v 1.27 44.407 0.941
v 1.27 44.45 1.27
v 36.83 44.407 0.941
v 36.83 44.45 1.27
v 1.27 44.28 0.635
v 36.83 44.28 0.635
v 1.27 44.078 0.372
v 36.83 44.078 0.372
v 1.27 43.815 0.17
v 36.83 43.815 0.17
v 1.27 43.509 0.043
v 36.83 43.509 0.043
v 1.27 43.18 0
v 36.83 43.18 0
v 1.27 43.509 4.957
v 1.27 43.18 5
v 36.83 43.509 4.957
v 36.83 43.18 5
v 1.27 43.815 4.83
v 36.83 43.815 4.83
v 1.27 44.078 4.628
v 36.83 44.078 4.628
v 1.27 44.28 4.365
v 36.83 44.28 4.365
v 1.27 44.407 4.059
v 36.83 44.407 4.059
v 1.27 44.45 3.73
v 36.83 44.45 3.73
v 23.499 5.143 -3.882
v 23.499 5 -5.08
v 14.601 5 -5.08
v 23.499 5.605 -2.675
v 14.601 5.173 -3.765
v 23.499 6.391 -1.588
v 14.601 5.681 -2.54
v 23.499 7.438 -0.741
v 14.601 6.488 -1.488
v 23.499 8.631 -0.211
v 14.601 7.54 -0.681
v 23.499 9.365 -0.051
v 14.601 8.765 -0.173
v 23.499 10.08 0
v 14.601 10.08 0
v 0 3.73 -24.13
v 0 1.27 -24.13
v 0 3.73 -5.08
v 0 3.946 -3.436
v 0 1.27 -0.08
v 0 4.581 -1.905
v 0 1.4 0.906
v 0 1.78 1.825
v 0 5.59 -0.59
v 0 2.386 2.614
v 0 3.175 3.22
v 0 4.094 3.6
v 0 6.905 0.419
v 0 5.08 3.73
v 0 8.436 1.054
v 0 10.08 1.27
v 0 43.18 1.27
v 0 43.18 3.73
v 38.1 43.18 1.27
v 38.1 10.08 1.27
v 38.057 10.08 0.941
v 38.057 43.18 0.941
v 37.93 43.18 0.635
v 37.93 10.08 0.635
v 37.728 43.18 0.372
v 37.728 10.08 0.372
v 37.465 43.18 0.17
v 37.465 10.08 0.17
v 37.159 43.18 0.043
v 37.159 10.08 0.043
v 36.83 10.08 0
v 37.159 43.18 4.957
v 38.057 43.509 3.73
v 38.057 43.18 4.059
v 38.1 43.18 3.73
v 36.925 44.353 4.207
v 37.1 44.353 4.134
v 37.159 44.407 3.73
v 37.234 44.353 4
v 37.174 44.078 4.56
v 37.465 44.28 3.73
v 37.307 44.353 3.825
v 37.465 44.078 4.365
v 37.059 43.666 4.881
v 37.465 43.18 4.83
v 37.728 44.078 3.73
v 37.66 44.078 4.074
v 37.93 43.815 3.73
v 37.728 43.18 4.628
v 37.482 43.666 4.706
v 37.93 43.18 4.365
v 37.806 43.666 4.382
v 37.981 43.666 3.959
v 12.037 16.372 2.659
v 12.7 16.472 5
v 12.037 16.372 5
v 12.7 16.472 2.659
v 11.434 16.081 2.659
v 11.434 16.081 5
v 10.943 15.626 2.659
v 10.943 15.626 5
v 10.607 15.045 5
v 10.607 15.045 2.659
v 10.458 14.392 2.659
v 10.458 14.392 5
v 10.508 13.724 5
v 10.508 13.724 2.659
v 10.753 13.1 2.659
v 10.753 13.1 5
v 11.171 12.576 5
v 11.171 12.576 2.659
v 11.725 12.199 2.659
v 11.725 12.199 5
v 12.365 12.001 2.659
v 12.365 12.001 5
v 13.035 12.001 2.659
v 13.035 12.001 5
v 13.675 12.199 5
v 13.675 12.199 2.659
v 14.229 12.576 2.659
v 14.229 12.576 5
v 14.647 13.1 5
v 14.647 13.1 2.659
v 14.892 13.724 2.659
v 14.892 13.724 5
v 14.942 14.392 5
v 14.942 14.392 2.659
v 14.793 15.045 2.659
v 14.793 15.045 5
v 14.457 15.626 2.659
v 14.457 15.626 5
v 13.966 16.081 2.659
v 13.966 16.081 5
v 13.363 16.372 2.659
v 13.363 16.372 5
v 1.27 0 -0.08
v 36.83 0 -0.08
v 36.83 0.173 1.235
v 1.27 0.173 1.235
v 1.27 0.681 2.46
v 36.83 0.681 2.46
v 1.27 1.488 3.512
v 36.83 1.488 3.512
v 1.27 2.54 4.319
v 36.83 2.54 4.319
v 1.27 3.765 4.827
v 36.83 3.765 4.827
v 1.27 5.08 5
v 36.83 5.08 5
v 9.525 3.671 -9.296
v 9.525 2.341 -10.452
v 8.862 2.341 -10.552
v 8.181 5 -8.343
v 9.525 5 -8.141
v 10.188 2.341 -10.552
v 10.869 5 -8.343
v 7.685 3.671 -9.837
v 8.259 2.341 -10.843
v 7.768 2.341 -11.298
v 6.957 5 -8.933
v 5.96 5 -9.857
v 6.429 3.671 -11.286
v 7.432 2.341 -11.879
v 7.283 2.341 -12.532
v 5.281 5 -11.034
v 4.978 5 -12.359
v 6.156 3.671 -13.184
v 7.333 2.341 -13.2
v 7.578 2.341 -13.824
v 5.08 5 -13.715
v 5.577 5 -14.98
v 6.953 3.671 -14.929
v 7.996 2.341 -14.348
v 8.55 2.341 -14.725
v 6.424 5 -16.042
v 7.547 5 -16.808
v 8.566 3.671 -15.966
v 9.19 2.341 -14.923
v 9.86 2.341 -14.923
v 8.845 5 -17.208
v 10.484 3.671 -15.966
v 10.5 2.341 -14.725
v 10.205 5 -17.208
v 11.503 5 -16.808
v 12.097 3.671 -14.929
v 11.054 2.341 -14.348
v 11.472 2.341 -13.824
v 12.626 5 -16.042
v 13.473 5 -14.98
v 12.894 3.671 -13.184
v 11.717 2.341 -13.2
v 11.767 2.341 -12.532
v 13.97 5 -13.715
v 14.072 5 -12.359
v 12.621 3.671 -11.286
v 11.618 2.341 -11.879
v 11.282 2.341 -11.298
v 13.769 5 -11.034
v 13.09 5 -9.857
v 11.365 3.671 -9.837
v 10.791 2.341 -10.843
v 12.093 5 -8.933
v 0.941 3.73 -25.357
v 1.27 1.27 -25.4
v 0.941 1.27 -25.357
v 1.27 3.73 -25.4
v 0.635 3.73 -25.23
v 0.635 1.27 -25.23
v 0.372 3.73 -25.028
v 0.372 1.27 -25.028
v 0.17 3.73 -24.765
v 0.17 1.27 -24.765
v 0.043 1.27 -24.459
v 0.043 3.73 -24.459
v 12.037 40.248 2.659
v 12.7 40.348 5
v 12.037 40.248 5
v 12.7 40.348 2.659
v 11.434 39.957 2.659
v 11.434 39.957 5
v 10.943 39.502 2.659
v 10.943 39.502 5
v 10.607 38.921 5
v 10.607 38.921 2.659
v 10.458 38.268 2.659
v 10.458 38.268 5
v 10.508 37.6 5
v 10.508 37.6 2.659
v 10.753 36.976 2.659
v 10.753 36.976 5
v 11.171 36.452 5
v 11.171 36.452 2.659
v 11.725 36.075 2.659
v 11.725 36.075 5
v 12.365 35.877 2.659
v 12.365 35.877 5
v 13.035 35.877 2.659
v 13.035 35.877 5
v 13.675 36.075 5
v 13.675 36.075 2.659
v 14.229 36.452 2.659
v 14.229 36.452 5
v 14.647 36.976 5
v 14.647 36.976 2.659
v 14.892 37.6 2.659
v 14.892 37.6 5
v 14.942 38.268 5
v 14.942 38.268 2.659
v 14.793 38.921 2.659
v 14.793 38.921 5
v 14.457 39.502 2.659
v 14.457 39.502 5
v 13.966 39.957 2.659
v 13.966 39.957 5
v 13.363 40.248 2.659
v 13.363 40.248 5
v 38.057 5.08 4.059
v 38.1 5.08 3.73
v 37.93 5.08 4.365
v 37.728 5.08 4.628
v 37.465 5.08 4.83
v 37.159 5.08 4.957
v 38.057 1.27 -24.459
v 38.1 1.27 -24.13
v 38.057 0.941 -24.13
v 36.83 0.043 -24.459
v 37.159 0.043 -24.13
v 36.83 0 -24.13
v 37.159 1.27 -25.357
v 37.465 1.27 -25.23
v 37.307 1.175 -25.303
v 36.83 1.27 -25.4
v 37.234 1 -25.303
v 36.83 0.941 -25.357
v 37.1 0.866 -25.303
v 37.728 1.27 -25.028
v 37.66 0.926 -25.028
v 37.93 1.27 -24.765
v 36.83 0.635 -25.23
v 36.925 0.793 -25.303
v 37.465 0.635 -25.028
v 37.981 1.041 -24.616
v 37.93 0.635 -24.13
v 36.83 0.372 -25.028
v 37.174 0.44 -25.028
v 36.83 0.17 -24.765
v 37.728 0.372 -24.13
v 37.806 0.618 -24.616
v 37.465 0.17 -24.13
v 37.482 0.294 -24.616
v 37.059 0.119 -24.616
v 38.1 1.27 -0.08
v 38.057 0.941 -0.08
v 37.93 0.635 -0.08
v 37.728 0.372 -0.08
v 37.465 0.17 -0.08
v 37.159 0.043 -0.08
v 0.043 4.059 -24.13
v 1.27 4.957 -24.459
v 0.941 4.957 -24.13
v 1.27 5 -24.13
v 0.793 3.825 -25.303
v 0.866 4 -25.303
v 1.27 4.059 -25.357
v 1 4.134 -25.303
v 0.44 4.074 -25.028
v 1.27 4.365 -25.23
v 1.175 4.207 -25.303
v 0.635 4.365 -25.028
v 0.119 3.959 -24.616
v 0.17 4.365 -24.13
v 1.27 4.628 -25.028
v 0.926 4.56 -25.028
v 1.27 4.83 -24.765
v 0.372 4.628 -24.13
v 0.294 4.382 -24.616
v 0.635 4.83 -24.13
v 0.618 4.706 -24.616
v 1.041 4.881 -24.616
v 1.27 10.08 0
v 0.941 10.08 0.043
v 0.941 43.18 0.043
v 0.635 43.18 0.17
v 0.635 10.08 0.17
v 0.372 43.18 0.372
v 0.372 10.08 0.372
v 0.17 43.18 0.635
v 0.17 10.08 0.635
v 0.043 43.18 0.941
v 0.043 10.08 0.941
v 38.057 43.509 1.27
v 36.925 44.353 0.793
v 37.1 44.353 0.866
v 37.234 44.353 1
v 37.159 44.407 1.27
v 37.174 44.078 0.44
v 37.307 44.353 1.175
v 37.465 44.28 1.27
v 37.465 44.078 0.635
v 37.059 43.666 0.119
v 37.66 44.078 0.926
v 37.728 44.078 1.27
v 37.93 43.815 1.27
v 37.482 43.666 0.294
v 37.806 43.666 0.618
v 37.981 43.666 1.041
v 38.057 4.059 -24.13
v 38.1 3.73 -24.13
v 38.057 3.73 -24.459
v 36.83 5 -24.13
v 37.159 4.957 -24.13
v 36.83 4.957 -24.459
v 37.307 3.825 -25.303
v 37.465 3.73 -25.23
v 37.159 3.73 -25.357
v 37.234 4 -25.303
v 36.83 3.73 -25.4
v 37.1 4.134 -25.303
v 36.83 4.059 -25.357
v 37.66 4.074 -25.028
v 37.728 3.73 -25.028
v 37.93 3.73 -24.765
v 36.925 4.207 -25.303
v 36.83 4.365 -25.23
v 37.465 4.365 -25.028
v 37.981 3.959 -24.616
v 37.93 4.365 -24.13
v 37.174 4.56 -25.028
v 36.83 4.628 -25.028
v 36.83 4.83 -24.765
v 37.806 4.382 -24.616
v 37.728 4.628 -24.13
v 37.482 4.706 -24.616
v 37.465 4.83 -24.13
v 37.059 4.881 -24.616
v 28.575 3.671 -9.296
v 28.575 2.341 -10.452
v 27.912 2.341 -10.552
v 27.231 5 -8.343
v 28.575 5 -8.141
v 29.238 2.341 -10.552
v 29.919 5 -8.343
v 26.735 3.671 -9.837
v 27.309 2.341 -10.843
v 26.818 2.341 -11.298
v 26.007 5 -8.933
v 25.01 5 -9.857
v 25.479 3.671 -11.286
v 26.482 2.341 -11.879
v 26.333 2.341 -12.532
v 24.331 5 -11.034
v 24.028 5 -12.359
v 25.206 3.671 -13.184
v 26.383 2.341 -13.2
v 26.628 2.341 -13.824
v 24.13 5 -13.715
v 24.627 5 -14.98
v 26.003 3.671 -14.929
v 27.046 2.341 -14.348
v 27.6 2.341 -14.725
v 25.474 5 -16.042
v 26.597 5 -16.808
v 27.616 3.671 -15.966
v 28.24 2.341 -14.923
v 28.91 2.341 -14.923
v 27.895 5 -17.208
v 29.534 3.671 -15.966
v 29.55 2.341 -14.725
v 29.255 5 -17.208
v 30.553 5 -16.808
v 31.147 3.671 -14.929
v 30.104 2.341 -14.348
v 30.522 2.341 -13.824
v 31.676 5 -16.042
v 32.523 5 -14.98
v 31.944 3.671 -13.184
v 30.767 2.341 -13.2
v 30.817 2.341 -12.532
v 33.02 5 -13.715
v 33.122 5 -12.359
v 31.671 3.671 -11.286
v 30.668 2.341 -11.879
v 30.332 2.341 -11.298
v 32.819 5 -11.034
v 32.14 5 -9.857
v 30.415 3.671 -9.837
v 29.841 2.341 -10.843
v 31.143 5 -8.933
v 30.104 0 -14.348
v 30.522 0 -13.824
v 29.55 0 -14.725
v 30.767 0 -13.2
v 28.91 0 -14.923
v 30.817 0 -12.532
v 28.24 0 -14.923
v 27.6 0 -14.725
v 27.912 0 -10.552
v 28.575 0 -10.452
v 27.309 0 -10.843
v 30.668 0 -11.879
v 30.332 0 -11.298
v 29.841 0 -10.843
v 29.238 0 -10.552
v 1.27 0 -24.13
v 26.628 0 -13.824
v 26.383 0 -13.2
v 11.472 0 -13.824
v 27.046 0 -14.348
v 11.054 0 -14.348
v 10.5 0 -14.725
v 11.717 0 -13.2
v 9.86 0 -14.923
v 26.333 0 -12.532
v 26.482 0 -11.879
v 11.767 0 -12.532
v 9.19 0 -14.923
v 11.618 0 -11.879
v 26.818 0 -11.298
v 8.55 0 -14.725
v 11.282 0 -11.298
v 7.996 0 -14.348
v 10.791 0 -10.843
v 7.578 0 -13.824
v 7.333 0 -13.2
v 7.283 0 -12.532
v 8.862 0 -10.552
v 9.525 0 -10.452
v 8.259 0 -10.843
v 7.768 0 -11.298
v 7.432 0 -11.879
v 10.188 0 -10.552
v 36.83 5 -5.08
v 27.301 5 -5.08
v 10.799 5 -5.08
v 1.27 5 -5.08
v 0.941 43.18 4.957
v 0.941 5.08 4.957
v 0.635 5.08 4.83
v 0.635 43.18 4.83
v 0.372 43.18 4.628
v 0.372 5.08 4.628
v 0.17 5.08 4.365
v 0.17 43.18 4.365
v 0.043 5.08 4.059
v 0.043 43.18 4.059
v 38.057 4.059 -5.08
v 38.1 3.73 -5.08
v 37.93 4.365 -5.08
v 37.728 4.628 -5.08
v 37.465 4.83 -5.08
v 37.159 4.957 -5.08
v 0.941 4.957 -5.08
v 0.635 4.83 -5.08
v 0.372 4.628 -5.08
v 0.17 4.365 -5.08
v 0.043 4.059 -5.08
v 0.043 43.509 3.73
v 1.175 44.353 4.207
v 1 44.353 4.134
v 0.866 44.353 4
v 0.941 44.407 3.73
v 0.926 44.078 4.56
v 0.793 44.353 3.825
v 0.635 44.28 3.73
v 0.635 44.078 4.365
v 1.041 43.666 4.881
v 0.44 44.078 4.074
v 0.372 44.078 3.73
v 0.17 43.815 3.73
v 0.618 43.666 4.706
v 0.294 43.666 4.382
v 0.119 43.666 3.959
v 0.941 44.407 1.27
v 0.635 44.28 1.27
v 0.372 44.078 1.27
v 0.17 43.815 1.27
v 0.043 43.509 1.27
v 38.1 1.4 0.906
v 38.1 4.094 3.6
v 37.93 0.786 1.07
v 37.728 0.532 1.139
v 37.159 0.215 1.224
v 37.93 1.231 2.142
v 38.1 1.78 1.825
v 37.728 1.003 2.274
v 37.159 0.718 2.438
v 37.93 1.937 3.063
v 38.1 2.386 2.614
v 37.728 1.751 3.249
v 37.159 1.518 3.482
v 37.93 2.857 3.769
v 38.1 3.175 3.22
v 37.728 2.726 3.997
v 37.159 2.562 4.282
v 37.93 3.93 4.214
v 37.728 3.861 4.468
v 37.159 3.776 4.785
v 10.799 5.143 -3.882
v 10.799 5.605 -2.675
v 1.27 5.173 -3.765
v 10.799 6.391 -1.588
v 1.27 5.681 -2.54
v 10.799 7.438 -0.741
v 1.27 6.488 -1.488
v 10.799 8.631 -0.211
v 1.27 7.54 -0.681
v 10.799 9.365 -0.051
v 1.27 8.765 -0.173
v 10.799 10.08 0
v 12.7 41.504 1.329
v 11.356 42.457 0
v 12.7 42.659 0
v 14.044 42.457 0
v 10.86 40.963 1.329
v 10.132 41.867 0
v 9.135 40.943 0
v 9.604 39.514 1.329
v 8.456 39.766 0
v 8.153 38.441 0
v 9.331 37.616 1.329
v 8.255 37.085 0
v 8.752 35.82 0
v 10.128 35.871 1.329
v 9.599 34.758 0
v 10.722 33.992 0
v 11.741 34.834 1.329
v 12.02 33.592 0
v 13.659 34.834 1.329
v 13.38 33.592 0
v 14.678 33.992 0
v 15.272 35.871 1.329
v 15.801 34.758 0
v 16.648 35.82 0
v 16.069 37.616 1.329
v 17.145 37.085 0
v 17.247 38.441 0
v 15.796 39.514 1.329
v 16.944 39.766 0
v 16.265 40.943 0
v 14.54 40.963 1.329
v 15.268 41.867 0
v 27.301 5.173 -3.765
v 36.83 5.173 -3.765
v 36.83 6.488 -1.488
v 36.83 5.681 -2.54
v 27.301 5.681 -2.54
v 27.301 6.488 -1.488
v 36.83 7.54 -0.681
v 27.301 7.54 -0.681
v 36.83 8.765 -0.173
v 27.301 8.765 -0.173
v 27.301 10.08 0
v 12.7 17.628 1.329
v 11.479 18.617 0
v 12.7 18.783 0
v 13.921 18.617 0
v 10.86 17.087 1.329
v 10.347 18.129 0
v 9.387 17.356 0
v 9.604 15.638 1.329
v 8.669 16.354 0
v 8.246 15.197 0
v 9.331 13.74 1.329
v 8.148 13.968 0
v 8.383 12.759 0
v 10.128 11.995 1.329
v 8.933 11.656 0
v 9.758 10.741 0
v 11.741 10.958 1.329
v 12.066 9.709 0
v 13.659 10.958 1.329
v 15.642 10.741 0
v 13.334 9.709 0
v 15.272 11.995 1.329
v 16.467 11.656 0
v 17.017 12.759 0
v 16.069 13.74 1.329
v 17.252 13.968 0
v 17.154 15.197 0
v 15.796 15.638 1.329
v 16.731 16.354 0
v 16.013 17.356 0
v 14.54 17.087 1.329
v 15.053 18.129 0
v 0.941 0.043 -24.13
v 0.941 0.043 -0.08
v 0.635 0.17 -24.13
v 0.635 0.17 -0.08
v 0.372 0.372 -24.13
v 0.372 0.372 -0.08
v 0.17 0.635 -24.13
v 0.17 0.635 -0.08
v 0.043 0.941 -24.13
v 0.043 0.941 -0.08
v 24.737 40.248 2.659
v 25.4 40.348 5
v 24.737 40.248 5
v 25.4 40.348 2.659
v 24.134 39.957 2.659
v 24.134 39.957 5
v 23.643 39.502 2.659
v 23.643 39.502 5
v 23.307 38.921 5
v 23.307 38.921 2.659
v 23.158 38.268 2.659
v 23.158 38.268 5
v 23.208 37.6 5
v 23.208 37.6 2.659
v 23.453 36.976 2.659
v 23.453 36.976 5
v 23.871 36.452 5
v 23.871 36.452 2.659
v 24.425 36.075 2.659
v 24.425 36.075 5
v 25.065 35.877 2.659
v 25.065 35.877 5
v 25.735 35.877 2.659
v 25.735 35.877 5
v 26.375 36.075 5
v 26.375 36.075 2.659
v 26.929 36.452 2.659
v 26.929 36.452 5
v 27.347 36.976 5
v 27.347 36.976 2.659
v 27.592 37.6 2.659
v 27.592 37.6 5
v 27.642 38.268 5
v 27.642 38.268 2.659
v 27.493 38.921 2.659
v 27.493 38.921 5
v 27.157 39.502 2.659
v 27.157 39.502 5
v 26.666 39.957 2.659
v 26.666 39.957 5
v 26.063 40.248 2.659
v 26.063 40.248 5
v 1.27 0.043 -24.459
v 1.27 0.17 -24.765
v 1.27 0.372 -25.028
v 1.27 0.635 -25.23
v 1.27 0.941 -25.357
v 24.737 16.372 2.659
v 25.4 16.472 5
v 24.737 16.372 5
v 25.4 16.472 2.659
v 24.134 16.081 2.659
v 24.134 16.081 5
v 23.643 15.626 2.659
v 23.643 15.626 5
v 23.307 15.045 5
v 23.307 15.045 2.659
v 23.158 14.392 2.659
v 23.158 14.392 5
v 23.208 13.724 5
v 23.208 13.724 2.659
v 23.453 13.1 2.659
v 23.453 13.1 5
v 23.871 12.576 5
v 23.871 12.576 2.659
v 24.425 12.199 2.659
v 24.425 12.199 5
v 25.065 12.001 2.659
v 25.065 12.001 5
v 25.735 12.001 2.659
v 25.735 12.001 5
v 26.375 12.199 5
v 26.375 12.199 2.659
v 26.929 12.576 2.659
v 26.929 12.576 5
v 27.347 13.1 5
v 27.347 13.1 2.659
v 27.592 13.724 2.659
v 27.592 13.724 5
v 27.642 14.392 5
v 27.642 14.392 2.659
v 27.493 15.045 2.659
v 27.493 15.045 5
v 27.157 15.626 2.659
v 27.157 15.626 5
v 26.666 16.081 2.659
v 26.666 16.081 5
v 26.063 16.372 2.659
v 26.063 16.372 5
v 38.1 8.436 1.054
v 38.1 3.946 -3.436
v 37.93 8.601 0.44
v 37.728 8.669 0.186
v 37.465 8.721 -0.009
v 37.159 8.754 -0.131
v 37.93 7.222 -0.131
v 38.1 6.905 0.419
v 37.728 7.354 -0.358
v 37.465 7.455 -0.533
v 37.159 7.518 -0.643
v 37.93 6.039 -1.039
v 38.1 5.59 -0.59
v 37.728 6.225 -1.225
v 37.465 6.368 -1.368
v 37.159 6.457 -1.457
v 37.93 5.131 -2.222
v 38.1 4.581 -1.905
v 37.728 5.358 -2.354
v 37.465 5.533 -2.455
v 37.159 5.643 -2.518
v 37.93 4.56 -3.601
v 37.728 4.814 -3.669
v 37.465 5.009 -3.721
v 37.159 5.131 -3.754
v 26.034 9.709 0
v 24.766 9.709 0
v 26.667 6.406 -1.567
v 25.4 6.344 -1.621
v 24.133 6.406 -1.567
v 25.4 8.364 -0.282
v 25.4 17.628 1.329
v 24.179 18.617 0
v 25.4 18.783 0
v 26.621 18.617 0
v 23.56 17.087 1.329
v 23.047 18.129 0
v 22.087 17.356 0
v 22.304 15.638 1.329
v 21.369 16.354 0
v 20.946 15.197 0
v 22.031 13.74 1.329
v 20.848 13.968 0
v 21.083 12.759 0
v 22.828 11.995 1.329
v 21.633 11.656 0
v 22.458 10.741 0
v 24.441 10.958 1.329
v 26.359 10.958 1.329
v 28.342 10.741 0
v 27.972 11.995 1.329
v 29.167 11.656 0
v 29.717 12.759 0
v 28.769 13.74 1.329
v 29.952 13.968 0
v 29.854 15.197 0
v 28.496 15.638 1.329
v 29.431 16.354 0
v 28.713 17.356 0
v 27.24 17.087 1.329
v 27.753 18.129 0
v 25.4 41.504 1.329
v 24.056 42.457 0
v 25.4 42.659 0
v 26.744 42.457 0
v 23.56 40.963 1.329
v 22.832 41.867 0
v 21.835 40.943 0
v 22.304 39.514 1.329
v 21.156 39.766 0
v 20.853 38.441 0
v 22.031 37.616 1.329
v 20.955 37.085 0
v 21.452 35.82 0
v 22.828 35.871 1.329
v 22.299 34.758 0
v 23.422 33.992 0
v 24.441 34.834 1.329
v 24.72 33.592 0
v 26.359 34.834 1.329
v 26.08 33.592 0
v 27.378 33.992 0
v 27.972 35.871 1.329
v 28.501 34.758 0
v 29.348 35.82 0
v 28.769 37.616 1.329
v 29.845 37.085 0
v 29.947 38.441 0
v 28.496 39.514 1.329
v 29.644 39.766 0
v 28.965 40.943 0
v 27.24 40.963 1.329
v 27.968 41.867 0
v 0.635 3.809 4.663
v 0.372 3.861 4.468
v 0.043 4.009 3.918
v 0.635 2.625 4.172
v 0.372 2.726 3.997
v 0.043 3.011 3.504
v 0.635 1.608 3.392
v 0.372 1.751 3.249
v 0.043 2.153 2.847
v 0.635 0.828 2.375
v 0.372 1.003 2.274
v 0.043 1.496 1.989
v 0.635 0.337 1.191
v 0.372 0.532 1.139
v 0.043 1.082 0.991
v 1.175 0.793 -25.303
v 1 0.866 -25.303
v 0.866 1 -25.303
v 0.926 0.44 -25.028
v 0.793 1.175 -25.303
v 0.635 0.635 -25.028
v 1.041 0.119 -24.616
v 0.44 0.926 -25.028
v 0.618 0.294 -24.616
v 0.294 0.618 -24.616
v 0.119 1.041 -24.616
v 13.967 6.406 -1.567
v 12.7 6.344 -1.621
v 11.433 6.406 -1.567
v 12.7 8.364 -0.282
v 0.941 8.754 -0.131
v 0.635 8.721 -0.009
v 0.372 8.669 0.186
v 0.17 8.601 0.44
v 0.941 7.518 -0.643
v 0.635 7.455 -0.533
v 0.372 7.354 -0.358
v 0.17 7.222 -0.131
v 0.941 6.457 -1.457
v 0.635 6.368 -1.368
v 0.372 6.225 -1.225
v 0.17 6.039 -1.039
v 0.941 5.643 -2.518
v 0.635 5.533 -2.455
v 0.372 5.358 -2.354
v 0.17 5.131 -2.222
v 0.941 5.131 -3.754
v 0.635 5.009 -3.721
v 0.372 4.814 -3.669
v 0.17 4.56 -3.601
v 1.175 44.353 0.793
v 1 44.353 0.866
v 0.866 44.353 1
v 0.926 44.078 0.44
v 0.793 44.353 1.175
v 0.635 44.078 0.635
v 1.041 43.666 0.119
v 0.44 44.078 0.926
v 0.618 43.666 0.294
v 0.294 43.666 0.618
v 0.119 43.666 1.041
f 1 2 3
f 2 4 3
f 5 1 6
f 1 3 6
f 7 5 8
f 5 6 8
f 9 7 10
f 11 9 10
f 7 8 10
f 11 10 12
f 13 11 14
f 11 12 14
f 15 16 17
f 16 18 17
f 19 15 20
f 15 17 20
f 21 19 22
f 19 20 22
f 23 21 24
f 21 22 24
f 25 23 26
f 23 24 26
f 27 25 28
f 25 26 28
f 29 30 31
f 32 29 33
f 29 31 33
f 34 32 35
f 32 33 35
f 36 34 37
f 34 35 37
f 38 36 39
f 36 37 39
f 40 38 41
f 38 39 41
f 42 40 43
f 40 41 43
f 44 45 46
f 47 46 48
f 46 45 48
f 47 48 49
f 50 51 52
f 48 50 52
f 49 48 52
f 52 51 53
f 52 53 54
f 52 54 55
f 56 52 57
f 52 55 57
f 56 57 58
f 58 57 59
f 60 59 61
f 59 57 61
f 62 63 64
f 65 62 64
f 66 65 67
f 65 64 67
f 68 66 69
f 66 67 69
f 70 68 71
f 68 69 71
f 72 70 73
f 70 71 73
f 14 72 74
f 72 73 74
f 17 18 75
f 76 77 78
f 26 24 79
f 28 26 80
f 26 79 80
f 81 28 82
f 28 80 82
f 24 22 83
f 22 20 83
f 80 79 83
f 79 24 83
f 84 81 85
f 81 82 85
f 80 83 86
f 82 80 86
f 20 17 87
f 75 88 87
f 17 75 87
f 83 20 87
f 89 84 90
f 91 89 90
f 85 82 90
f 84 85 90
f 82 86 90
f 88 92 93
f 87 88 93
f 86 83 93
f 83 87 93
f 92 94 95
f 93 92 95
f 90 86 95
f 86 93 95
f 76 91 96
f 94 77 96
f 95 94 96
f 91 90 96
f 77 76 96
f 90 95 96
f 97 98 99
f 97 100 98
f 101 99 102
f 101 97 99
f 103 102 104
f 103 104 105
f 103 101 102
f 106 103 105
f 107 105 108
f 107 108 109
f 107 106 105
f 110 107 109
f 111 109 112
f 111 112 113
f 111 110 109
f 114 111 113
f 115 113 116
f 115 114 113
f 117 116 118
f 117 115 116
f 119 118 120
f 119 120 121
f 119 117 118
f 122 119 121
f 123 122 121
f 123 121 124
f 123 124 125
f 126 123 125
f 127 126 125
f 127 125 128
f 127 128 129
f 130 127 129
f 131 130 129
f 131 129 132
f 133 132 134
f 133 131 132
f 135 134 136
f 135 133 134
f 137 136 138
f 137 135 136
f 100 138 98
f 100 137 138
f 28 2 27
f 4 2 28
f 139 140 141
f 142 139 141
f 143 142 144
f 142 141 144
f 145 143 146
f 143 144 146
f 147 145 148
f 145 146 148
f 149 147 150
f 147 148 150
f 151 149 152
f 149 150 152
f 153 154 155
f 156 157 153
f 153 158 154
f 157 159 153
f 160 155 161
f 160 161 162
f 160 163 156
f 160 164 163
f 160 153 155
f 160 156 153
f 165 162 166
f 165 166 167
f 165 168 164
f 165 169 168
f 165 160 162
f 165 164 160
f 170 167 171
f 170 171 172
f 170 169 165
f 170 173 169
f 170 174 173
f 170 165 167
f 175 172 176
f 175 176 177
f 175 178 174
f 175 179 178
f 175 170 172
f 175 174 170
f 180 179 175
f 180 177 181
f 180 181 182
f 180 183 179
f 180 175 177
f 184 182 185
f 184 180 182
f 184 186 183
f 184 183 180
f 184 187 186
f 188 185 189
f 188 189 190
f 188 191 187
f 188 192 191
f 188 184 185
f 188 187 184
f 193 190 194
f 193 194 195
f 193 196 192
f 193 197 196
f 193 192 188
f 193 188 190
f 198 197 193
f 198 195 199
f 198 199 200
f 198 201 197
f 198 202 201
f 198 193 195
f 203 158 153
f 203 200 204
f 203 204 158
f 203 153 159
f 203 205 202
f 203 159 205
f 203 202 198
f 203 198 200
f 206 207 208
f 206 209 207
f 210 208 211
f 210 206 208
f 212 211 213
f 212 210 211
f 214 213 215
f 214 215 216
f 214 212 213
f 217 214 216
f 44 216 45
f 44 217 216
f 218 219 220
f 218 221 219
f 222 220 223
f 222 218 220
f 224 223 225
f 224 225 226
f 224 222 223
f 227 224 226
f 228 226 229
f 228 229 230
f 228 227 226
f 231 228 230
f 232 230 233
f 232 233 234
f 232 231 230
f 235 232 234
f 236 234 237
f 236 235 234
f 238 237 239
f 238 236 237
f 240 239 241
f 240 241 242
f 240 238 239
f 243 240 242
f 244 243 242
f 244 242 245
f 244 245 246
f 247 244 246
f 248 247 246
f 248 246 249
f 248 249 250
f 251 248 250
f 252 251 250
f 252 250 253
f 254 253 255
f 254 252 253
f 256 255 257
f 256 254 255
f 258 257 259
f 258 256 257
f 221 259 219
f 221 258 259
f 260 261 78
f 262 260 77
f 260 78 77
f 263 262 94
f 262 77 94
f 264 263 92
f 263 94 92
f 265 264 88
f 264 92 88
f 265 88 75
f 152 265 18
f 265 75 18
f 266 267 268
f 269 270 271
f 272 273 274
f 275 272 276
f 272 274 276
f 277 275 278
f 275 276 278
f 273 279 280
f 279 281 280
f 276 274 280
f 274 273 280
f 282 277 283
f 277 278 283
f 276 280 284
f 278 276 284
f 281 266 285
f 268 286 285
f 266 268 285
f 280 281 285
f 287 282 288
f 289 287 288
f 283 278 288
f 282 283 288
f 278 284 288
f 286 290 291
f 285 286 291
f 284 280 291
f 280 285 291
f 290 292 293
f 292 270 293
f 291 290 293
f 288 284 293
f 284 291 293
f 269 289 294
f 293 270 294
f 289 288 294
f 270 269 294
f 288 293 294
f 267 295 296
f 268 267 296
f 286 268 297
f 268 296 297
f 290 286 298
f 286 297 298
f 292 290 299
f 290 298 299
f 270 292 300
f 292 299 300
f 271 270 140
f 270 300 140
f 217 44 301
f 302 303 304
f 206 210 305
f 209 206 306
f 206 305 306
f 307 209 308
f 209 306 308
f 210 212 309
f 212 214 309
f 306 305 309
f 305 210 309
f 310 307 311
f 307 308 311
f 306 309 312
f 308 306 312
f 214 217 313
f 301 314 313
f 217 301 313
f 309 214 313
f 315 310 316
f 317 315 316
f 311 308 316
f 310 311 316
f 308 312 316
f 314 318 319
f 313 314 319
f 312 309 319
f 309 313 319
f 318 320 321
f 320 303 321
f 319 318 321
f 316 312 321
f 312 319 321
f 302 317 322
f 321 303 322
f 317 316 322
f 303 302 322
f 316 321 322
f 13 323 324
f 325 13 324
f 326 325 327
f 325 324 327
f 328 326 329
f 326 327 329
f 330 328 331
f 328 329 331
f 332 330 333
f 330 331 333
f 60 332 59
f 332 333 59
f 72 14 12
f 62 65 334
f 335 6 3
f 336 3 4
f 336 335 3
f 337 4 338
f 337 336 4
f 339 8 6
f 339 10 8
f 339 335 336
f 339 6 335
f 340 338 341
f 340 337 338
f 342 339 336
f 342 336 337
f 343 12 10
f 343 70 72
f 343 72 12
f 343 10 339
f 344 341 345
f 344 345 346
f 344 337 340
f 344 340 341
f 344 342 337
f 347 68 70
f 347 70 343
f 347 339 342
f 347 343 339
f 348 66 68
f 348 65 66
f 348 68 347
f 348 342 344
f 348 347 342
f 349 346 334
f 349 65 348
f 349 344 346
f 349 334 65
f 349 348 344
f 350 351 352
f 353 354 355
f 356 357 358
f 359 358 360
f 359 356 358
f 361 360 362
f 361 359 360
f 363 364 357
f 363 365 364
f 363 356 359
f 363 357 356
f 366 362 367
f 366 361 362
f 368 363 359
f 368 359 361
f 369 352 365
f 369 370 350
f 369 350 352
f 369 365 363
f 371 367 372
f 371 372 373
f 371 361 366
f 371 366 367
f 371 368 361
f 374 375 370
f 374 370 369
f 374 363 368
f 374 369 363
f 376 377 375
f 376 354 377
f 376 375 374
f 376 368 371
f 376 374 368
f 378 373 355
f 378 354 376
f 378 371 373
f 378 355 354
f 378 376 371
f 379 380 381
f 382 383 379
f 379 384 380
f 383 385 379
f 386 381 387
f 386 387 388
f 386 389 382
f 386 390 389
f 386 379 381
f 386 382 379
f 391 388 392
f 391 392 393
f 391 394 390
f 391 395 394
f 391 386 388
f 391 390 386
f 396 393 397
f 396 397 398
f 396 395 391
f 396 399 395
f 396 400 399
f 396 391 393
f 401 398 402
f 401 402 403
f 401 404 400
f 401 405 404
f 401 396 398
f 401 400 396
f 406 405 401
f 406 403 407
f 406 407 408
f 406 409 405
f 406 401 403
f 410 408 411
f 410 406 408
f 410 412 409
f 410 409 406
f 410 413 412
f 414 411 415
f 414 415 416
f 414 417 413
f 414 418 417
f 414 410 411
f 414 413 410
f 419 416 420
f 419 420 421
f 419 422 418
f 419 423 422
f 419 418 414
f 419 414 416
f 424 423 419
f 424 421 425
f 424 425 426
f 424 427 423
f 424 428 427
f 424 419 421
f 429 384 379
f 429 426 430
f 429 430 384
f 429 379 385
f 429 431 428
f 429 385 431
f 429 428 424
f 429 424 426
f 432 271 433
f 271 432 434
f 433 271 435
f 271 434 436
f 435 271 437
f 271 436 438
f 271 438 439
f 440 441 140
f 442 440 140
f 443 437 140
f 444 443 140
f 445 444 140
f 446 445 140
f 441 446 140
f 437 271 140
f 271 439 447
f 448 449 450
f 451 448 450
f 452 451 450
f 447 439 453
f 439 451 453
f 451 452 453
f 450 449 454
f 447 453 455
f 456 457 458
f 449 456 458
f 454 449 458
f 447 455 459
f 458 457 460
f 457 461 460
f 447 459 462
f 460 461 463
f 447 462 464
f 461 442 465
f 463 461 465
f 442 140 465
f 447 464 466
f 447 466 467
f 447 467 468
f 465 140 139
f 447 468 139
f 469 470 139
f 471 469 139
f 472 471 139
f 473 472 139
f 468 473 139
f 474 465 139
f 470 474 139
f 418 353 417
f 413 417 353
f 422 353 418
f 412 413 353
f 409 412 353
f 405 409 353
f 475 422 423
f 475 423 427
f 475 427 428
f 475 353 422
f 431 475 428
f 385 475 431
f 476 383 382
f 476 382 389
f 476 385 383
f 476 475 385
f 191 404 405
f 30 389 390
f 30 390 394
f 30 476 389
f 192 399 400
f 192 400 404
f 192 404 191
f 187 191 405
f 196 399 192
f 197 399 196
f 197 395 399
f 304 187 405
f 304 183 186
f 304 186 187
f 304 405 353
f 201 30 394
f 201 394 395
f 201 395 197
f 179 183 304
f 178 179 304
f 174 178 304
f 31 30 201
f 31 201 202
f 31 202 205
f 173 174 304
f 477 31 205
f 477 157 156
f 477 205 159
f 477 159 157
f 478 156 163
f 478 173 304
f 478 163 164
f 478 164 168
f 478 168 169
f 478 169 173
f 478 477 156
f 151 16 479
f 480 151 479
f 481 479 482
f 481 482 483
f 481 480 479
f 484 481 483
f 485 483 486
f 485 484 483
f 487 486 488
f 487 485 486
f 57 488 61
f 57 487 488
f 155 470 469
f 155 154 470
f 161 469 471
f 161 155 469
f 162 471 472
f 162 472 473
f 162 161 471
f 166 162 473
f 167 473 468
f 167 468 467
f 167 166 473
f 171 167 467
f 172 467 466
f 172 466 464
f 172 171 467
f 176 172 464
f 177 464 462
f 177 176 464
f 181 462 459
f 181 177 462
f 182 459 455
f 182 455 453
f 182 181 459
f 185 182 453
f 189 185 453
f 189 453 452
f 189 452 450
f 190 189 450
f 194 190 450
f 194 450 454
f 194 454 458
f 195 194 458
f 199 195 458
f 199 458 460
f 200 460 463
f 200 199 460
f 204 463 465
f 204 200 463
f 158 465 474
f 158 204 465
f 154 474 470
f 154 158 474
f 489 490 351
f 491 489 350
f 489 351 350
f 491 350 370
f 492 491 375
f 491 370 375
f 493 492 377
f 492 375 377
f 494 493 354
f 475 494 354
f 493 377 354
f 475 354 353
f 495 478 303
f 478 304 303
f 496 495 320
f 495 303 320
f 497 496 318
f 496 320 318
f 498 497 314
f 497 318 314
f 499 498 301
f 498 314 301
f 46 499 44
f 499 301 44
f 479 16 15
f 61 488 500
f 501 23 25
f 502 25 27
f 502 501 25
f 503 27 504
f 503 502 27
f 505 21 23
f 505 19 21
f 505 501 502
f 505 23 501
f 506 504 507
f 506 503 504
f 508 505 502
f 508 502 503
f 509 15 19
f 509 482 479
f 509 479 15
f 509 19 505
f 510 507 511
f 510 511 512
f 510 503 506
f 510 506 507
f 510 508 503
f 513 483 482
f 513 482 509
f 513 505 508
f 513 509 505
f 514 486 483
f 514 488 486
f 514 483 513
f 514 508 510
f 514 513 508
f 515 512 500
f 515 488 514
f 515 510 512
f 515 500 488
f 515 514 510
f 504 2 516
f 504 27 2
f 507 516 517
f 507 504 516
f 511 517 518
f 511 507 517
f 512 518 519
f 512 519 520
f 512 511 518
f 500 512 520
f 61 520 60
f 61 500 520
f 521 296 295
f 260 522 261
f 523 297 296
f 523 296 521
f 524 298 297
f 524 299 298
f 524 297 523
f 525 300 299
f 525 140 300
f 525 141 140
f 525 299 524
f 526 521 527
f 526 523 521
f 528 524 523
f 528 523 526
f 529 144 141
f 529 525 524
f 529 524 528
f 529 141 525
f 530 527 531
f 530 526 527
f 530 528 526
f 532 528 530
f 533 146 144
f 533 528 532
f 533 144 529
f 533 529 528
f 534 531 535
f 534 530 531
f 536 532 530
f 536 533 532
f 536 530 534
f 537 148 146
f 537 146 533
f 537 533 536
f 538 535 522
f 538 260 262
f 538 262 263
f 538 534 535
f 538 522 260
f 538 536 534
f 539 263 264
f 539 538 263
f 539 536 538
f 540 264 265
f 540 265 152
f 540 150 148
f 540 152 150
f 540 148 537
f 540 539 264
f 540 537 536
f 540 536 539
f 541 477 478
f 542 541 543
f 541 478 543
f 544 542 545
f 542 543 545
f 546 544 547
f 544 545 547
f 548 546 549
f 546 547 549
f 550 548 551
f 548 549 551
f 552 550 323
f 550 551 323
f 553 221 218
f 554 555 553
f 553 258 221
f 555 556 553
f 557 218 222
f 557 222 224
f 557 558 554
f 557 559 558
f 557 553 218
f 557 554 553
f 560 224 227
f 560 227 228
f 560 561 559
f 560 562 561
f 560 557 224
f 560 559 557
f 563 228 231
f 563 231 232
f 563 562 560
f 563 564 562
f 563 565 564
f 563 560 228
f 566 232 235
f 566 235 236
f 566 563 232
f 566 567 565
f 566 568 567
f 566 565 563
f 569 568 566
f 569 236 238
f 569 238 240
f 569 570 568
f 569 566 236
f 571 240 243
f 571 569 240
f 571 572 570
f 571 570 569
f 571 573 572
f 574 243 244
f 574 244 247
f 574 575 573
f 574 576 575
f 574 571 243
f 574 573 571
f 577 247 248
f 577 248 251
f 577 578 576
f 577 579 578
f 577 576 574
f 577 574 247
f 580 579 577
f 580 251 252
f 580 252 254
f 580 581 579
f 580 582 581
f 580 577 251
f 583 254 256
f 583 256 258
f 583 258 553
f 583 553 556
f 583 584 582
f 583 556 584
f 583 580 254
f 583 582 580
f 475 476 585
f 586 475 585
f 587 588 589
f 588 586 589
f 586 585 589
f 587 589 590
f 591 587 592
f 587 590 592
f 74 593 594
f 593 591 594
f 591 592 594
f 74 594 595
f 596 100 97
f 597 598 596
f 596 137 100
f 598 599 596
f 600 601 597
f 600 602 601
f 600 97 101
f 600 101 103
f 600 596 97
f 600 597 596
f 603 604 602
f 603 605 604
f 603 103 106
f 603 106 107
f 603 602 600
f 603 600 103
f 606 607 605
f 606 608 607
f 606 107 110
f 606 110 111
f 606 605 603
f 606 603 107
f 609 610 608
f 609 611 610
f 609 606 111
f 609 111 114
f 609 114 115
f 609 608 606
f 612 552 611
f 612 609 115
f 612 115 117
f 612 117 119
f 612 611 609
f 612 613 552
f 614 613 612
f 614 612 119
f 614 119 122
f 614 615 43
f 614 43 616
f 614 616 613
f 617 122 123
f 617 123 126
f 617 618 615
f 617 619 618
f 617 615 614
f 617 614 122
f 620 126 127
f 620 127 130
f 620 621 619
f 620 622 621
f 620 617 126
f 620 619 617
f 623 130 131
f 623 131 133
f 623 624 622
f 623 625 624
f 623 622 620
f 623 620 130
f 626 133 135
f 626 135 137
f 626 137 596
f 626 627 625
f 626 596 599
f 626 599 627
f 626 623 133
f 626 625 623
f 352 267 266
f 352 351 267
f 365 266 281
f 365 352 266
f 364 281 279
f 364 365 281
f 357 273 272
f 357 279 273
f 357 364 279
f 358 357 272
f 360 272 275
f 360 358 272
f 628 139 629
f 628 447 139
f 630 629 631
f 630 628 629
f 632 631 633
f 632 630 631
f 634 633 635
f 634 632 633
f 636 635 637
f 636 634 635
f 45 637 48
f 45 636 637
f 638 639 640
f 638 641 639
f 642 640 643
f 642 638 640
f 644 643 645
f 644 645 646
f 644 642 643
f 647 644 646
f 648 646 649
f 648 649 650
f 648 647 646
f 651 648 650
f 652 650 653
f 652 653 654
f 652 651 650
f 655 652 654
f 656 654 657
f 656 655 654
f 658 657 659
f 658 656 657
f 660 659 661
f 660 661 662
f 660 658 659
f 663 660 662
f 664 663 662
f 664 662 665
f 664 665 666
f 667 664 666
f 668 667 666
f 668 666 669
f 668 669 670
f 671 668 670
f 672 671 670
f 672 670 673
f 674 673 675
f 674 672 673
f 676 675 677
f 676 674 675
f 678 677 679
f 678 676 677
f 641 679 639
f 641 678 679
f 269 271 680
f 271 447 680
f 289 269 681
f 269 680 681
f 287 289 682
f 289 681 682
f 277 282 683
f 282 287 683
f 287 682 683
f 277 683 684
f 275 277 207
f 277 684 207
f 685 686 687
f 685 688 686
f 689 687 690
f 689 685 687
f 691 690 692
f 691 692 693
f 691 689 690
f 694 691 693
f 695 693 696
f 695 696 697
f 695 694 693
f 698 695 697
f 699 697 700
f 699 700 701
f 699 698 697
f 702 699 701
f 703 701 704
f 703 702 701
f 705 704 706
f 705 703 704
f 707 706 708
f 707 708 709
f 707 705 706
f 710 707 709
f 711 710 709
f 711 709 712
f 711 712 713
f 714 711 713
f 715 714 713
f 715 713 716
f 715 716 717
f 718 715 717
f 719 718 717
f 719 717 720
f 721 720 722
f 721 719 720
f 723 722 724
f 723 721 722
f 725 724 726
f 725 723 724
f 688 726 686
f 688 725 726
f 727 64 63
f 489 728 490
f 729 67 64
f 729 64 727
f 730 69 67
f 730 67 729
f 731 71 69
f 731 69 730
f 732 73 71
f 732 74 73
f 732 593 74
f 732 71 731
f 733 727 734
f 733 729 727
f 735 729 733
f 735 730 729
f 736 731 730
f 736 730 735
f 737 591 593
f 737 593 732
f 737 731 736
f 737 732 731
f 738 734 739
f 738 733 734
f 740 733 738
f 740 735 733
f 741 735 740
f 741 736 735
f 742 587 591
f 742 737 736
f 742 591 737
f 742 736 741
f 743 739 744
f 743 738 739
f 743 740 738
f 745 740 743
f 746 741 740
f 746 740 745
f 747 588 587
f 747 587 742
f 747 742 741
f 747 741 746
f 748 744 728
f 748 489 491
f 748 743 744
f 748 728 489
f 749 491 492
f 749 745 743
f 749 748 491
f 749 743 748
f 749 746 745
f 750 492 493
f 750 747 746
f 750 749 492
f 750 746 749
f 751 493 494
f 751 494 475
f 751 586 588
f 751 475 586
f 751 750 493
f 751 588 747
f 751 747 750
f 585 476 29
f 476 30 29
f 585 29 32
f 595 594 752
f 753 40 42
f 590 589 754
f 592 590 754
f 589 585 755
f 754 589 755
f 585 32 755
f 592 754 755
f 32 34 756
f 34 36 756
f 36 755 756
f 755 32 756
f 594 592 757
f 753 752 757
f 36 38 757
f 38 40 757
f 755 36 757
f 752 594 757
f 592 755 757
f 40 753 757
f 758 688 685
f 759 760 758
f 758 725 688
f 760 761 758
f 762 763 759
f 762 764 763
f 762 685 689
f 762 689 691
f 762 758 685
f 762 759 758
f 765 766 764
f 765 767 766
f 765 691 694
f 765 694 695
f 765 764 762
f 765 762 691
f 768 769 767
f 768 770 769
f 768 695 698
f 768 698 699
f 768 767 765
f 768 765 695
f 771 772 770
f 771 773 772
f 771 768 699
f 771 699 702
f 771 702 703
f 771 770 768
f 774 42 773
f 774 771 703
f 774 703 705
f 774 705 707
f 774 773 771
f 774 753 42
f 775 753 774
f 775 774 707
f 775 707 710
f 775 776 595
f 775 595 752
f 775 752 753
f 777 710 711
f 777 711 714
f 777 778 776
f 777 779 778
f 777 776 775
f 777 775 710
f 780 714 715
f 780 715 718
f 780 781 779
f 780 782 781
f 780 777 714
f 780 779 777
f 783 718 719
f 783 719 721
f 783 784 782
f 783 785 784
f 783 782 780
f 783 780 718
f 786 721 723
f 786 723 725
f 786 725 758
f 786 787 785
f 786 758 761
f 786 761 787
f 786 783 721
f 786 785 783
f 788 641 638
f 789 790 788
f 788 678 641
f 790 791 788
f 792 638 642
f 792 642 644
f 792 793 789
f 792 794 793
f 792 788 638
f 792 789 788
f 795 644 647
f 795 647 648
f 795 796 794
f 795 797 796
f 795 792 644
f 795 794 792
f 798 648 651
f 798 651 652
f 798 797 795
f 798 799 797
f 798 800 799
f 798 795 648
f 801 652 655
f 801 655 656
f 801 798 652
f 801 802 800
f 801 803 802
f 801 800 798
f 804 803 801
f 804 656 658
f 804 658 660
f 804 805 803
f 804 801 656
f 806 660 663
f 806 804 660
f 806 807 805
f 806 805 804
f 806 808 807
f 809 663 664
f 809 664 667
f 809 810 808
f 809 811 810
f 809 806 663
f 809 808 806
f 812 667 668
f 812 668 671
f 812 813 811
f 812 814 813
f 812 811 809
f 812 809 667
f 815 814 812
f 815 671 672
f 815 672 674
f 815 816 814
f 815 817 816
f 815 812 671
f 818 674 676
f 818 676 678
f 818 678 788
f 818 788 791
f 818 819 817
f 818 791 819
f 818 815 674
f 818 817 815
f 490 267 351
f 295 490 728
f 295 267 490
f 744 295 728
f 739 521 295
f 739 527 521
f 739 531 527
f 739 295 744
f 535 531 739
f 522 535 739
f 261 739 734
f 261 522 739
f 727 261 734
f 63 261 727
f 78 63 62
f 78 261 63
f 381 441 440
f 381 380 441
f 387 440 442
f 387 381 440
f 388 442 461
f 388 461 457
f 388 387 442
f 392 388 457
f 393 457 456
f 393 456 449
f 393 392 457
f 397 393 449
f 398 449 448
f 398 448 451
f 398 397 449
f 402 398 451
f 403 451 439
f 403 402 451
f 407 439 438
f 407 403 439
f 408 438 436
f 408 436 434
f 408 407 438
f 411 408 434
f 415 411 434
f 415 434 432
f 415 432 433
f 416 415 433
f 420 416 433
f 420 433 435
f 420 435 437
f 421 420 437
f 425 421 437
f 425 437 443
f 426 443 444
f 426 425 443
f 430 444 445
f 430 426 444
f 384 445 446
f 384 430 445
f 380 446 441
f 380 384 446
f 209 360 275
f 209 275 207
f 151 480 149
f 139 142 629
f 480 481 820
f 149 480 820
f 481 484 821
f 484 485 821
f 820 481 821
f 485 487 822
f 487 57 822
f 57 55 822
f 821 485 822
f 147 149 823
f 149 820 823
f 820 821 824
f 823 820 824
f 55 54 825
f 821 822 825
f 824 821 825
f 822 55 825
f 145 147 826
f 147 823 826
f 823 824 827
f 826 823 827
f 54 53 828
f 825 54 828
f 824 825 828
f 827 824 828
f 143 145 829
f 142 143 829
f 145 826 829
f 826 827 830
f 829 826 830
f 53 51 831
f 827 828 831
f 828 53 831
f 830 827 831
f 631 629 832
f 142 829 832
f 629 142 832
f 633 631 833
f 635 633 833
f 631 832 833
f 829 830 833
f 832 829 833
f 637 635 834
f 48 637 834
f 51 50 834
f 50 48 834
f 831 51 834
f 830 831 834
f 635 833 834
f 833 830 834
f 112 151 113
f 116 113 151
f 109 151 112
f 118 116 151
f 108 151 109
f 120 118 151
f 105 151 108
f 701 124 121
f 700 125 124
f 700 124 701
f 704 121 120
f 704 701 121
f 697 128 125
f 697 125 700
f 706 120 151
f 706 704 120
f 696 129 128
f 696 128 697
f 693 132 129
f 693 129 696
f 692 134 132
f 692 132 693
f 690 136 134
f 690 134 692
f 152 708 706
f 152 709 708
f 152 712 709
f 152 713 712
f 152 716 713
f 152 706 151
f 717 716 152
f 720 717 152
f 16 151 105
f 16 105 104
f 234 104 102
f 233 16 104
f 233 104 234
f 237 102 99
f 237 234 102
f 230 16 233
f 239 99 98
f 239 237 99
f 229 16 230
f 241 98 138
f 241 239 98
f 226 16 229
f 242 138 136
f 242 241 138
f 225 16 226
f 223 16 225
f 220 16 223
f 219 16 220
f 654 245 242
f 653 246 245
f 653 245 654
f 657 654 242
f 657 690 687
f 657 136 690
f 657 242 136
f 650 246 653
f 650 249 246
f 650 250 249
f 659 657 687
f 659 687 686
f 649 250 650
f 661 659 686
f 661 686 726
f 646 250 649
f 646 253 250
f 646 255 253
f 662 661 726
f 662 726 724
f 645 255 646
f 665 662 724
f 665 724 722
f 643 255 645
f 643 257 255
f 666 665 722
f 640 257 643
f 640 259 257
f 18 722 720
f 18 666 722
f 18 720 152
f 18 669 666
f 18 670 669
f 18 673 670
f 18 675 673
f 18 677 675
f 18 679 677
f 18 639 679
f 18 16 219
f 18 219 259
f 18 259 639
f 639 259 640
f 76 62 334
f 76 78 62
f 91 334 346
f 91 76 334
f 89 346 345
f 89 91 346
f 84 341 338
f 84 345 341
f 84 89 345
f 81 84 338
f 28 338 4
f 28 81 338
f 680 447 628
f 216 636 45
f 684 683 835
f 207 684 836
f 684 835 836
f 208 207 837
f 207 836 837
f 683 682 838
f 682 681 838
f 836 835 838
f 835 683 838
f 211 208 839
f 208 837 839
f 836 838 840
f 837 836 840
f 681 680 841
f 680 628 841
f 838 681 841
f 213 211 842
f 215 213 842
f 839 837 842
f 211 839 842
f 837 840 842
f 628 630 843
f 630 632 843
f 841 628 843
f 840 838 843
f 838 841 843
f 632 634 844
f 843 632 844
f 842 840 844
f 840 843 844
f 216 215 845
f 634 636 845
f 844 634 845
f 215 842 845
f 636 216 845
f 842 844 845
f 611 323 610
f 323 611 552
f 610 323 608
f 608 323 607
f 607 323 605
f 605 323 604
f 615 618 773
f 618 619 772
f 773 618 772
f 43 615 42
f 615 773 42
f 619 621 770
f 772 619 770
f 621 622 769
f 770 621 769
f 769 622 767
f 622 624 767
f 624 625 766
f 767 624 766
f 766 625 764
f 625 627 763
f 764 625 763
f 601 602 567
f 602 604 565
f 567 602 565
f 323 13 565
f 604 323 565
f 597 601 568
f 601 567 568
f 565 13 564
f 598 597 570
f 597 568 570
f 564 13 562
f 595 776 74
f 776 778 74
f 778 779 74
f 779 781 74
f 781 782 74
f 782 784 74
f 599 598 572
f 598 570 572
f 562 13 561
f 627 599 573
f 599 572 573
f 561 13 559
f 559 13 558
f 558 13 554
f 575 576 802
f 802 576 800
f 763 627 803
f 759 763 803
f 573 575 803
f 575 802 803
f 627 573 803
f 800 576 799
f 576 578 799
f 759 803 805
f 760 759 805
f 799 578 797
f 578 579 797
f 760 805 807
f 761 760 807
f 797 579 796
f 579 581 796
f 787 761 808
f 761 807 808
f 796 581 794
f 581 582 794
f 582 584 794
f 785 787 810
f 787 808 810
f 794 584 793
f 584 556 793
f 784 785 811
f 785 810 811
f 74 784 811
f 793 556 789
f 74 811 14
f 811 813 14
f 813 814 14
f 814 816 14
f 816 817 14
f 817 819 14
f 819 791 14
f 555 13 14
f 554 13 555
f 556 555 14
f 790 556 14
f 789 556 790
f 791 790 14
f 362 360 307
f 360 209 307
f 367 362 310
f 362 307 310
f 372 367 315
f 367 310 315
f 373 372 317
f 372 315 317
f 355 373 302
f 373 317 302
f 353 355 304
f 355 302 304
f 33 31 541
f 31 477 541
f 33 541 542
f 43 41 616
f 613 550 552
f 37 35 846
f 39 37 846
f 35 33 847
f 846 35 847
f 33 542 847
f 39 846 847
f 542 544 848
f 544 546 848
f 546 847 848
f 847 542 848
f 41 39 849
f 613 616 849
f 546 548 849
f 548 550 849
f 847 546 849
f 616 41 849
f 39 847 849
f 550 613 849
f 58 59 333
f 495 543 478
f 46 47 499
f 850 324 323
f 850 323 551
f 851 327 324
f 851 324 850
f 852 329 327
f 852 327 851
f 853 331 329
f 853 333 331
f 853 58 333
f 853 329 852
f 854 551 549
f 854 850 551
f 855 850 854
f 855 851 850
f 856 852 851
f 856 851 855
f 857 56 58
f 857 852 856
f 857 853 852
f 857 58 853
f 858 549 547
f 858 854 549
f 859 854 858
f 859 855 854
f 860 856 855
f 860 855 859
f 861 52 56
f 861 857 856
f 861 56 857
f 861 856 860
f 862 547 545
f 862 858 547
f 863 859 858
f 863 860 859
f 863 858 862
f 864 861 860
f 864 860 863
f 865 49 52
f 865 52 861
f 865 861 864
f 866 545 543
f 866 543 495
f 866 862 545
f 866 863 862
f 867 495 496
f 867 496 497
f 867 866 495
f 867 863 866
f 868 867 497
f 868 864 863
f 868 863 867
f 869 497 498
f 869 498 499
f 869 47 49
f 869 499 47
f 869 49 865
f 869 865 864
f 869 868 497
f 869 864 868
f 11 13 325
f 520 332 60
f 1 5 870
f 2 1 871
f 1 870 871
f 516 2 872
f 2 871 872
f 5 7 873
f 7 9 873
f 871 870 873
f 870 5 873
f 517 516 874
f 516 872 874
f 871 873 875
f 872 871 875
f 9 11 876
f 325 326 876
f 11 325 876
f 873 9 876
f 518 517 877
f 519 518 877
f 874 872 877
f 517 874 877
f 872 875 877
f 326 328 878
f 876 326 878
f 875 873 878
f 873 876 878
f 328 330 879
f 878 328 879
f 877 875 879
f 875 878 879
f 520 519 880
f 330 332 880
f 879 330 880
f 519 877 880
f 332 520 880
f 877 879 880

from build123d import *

# Parameters (mm, degrees)
SKETCH1_W                                     = 38.1
SKETCH1_H                                     = 44.45
BOSS_EXTRUDE1_DEPTH                           = 5
SKETCH2_W                                     = 38.1
SKETCH2_H                                     = 5
BOSS_EXTRUDE2_DEPTH                           = 25.4
CSK_FOR_8_FLAT_HEAD_SOCKET_CAP_SCREW1_A_COUNT = 2
CSK_FOR_8_FLAT_HEAD_SOCKET_CAP_SCREW1_A_PITCH = 12.7
CSK_FOR_8_FLAT_HEAD_SOCKET_CAP_SCRE_2_COUNT   = 2
CSK_FOR_8_FLAT_HEAD_SOCKET_CAP_SCRE_2_PITCH   = 27.043545921
CSK_FOR_8_FLAT_HEAD_SOCKET_CAP_SCRE_3_COUNT   = 2
CSK_FOR_8_FLAT_HEAD_SOCKET_CAP_SCRE_3_PITCH   = 23.876
CSK_FOR_8_FLAT_HEAD_SOCKET_CAP_SCREW2_A_COUNT = 2
CSK_FOR_8_FLAT_HEAD_SOCKET_CAP_SCREW2_A_PITCH = 19.05
FILLET1_R                                     = 5.08
FILLET2_R                                     = 5.08
FILLET3_R                                     = 1.27


with BuildPart() as part:
    # Sketch1 → Boss-Extrude1 (new body)
    with BuildSketch(Plane.XY):
        with Locations((19.05, 22.225)):
            Rectangle(SKETCH1_W, SKETCH1_H)
    extrude(amount=BOSS_EXTRUDE1_DEPTH)

    # Sketch2 → Boss-Extrude2 (add)
    with BuildSketch(Plane(origin=(0, 0, 0), x_dir=(-1, 0, 0), z_dir=(0, 0, -1))):
        with Locations((-19.05, 2.5)):
            Rectangle(SKETCH2_W, SKETCH2_H)
    extrude(amount=BOSS_EXTRUDE2_DEPTH)

    # Sketch4 → CSK for #8 Flat Head Socket Cap Screw1 (revolve, cut)
    with BuildSketch(Plane(origin=(25.4, 38.1, 0), x_dir=(0, 1, 0), z_dir=(1, 0, 0))):
        Polygon((0, 0), (0, 5), (2.2479, 5), (2.2479, 2.658961536), (4.5593, 0), align=None)
    csk_for_8_flat_head_socket_cap_screw1 = revolve(axis=Axis((25.4, 38.1, -6.35), (0, 0, 1)), mode=Mode.SUBTRACT)

    # CSK for #8 Flat Head Socket Cap Screw1 a: CSK for #8 Flat Head Socket Cap Screw1 ×2
    with Locations(*[(-i * CSK_FOR_8_FLAT_HEAD_SOCKET_CAP_SCREW1_A_PITCH, 0, 0) for i in range(1, CSK_FOR_8_FLAT_HEAD_SOCKET_CAP_SCREW1_A_COUNT)]):
        add(csk_for_8_flat_head_socket_cap_screw1, mode=Mode.SUBTRACT)

    # CSK for _8 Flat Head Socket Cap Scre 2: CSK for #8 Flat Head Socket Cap Screw1 ×2
    with Locations(*[Vector(-0.4696129729783402, -0.8828723891992799, 0) * (i * CSK_FOR_8_FLAT_HEAD_SOCKET_CAP_SCRE_2_PITCH) for i in range(1, CSK_FOR_8_FLAT_HEAD_SOCKET_CAP_SCRE_2_COUNT)]):
        add(csk_for_8_flat_head_socket_cap_screw1, mode=Mode.SUBTRACT)

    # CSK for _8 Flat Head Socket Cap Scre 3: CSK for #8 Flat Head Socket Cap Screw1 ×2
    with Locations(*[(0, -i * CSK_FOR_8_FLAT_HEAD_SOCKET_CAP_SCRE_3_PITCH, 0) for i in range(1, CSK_FOR_8_FLAT_HEAD_SOCKET_CAP_SCRE_3_COUNT)]):
        add(csk_for_8_flat_head_socket_cap_screw1, mode=Mode.SUBTRACT)

    # Sketch6 → CSK for #8 Flat Head Socket Cap Screw2 (revolve, cut)
    with BuildSketch(Plane(origin=(28.575, 5, -12.7), x_dir=(0, 0, 1), z_dir=(1, 0, 0))):
        Polygon((0, 0), (0, 5), (2.2479, 5), (2.2479, 2.658961536), (4.5593, 0), align=None)
    csk_for_8_flat_head_socket_cap_screw2 = revolve(axis=Axis((28.575, 11.35, -12.7), (0, -1, 0)), mode=Mode.SUBTRACT)

    # CSK for #8 Flat Head Socket Cap Screw2 a: CSK for #8 Flat Head Socket Cap Screw2 ×2
    with Locations(*[(-i * CSK_FOR_8_FLAT_HEAD_SOCKET_CAP_SCREW2_A_PITCH, 0, 0) for i in range(1, CSK_FOR_8_FLAT_HEAD_SOCKET_CAP_SCREW2_A_COUNT)]):
        add(csk_for_8_flat_head_socket_cap_screw2, mode=Mode.SUBTRACT)

    # Fillet1
    fillet1_edges = [part.edges().sort_by_distance(p)[0] for p in [
        (19.05, 5, 0),
    ]]
    fillet(fillet1_edges, radius=FILLET1_R)

    # Fillet2
    fillet2_edges = [part.edges().sort_by_distance(p)[0] for p in [
        (19.05, 0, 5),
    ]]
    fillet(fillet2_edges, radius=FILLET2_R)

    # Fillet3
    fillet3_edges = [part.edges().sort_by_distance(p)[0] for p in [
        (38.1, 24.765, 5),
        (38.1, 0, -12.74),
        (38.1, 1.487897552, 3.512102448),
        (0, 0, -12.74),
        (0, 1.487897552, 3.512102448),
        (38.1, 5, -15.24),
        (0, 5, -15.24),
        (38.1, 2.5, -25.4),
        (19.05, 44.45, 5),
        (19.05, 0, -25.4),
        (0, 2.5, -25.4),
        (19.05, 5, -25.4),
        (0, 24.765, 5),
        (19.05, 44.45, 0),
        (0, 27.265, 0),
        (38.1, 27.265, 0),
        (38.1, 6.487897552, -1.487897552),
        (0, 44.45, 2.5),
        (0, 6.487897552, -1.487897552),
        (38.1, 44.45, 2.5),
    ]]
    fillet(fillet3_edges, radius=FILLET3_R)


solid = part.part
